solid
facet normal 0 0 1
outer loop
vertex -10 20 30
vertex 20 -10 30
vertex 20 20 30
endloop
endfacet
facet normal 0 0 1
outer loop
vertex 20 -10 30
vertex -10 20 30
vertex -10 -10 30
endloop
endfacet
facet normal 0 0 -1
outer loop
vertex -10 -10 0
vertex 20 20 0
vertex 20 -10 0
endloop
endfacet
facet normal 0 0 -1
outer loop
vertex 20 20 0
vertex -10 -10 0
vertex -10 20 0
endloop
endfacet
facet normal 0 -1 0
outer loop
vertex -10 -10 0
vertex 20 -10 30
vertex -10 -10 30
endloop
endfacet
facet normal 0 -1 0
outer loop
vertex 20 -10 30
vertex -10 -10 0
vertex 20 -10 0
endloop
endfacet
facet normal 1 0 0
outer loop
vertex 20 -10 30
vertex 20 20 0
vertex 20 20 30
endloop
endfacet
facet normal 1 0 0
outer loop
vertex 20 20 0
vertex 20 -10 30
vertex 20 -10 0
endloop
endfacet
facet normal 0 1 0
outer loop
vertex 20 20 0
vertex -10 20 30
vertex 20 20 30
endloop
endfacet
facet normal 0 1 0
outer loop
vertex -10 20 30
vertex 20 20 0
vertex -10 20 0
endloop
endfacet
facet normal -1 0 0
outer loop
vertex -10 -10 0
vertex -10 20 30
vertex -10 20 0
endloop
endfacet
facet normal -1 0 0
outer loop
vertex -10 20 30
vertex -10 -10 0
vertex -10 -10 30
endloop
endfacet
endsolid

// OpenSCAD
//just call build_plate(); with the following arguments (also, you have to have a real object in your scene for this to render)

//putting 0 as the first argument will give you a manually adjustable build plate (note: if you use this option, you need to specify your build plates X length (in mm) as the second argument and the Y length (in mm) as the third argument. eg. build_plate(0,150,120);)
//putting 1 as the first argument will give you a Replicator 1 build plate, 2 gives rep 2, see read me for list (or look down)
/*

to give your user control of which build plate they see in Customizer, include the following code:

use <utils/build_plate.scad>//this would work if makerbot overrides theirs with mine.
*/

/*[build_plate]*/

//to see how this works, uncomment (or use) the following code

//build plate numbers subject to change, will have figured out soonish... Probably will change around a fair amount anyway...      for display only, doesn't contribute to final object
build_plate_selector = 1; //[0: Manual, 1: Replicator, 2: Replicator 2, 3: Replicator 2X, 4: Replicator (5th Generation), 5: Replicator Mini, 6: Replicator Z18, 7: Thing-O-Matic, 8: Cupcake CNC, 9: Afinia H480, 10: Afinia H800, 11: AW3D HD, 12: B9Creator, 13: Robox, 14: Bukito, 15: Bukobot V2, 16: Form 1, 17: Form 2, 18: hyrel, 19: Creatr, 20: Xeed, 21: TAZ, 22: TAZ Mini, 23: Makergear M2, 24: Printrbot Plus, 25: Printrbot Simple Kit, 26: Printrbot Go small, 27: Printrbot Go medium, 28: Printrbot Go large,29:Diamond Age Moa,]
//when Build Plate Selector is set to "manual" this controls the build plate x dimension
build_plate_manual_x = 100; //[100:400]
//when Build Plate Selector is set to "manual" this controls the build plate y dimension
build_plate_manual_y = 100; //[100:400]
build_plate(build_plate_selector,build_plate_manual_x,build_plate_manual_y);
/*[extra_feature_to_control_the_cube]*/
//1 square = 1cm aka 10mm, 5 squares is about 2 inches (so .8mm above 2 inches)s
squares_the_cube_takes_up = 3;//[1:20]
if(squares_the_cube_takes_up%2 == 0){
	translate([0,0,squares_the_cube_takes_up*5]){
		cube(squares_the_cube_takes_up*10,center =true);
	}
}
else{
	translate([5,5,squares_the_cube_takes_up*5]){
		cube(squares_the_cube_takes_up*10,center =true);
	}
}
module build_plate(bp,manX,manY){
		build_plate_templates = [[manX,manY,"manual"],[252,199,"Replicator"],[285,153,"Replicator 2"],[246,152,"Replicator 2X"],[252,199,"Replicator (5th Generation)"],[100,100,"Replicator Mini"],[300,305,"Replicator Z18"],[120,120,"Thing-O-Matic"],[100,100,"Cupcake CNC"],[140,140,"Afinia H480"],[254,203.2,"Afinia H800"],[317.5,203.2,"AW3D HD"],[104,75,"B9Creator"],[210,150,"Robox"],[150,150,"Bukito"],[200,200,"Bukobot V2"],[125,125,"Form 1"],[145,145,"Form 2"],[200,200,"hyrel"],[230,270,"Creatr"],[280,220,"Xeed"],[298,275,"TAZ"],[152,152,"TAZ Mini"],[203.2,254,"Makergear M2"],[250,250,"Printrbot Plus"],[150,150,"Printrbot Simple Kit"],[203,152,"Printrbot Go small"],[406,203,"Printrbot Go medium"],[610,305,"Printrbot Go large"],[400,400,"Diamond Age Moa"]];
		translate([0,0,-.52]){
			%cube([build_plate_templates[bp][0],build_plate_templates[bp][1],1],center = true);
			
		}
		translate([0,0,-.5]){
			for(i = [-1*floor(build_plate_templates[bp][0]/20):build_plate_templates[bp][0]/20]){
					translate([i*10,0,0])
						%cube([.5,build_plate_templates[bp][1],1.01],center = true);
				}
				for(i = [-1*floor(build_plate_templates[bp][1]/20):build_plate_templates[bp][1]/20]){
					translate([0,i*10,0])
						%cube([build_plate_templates[bp][0],.5,1.01],center = true);
				}
		}
}
